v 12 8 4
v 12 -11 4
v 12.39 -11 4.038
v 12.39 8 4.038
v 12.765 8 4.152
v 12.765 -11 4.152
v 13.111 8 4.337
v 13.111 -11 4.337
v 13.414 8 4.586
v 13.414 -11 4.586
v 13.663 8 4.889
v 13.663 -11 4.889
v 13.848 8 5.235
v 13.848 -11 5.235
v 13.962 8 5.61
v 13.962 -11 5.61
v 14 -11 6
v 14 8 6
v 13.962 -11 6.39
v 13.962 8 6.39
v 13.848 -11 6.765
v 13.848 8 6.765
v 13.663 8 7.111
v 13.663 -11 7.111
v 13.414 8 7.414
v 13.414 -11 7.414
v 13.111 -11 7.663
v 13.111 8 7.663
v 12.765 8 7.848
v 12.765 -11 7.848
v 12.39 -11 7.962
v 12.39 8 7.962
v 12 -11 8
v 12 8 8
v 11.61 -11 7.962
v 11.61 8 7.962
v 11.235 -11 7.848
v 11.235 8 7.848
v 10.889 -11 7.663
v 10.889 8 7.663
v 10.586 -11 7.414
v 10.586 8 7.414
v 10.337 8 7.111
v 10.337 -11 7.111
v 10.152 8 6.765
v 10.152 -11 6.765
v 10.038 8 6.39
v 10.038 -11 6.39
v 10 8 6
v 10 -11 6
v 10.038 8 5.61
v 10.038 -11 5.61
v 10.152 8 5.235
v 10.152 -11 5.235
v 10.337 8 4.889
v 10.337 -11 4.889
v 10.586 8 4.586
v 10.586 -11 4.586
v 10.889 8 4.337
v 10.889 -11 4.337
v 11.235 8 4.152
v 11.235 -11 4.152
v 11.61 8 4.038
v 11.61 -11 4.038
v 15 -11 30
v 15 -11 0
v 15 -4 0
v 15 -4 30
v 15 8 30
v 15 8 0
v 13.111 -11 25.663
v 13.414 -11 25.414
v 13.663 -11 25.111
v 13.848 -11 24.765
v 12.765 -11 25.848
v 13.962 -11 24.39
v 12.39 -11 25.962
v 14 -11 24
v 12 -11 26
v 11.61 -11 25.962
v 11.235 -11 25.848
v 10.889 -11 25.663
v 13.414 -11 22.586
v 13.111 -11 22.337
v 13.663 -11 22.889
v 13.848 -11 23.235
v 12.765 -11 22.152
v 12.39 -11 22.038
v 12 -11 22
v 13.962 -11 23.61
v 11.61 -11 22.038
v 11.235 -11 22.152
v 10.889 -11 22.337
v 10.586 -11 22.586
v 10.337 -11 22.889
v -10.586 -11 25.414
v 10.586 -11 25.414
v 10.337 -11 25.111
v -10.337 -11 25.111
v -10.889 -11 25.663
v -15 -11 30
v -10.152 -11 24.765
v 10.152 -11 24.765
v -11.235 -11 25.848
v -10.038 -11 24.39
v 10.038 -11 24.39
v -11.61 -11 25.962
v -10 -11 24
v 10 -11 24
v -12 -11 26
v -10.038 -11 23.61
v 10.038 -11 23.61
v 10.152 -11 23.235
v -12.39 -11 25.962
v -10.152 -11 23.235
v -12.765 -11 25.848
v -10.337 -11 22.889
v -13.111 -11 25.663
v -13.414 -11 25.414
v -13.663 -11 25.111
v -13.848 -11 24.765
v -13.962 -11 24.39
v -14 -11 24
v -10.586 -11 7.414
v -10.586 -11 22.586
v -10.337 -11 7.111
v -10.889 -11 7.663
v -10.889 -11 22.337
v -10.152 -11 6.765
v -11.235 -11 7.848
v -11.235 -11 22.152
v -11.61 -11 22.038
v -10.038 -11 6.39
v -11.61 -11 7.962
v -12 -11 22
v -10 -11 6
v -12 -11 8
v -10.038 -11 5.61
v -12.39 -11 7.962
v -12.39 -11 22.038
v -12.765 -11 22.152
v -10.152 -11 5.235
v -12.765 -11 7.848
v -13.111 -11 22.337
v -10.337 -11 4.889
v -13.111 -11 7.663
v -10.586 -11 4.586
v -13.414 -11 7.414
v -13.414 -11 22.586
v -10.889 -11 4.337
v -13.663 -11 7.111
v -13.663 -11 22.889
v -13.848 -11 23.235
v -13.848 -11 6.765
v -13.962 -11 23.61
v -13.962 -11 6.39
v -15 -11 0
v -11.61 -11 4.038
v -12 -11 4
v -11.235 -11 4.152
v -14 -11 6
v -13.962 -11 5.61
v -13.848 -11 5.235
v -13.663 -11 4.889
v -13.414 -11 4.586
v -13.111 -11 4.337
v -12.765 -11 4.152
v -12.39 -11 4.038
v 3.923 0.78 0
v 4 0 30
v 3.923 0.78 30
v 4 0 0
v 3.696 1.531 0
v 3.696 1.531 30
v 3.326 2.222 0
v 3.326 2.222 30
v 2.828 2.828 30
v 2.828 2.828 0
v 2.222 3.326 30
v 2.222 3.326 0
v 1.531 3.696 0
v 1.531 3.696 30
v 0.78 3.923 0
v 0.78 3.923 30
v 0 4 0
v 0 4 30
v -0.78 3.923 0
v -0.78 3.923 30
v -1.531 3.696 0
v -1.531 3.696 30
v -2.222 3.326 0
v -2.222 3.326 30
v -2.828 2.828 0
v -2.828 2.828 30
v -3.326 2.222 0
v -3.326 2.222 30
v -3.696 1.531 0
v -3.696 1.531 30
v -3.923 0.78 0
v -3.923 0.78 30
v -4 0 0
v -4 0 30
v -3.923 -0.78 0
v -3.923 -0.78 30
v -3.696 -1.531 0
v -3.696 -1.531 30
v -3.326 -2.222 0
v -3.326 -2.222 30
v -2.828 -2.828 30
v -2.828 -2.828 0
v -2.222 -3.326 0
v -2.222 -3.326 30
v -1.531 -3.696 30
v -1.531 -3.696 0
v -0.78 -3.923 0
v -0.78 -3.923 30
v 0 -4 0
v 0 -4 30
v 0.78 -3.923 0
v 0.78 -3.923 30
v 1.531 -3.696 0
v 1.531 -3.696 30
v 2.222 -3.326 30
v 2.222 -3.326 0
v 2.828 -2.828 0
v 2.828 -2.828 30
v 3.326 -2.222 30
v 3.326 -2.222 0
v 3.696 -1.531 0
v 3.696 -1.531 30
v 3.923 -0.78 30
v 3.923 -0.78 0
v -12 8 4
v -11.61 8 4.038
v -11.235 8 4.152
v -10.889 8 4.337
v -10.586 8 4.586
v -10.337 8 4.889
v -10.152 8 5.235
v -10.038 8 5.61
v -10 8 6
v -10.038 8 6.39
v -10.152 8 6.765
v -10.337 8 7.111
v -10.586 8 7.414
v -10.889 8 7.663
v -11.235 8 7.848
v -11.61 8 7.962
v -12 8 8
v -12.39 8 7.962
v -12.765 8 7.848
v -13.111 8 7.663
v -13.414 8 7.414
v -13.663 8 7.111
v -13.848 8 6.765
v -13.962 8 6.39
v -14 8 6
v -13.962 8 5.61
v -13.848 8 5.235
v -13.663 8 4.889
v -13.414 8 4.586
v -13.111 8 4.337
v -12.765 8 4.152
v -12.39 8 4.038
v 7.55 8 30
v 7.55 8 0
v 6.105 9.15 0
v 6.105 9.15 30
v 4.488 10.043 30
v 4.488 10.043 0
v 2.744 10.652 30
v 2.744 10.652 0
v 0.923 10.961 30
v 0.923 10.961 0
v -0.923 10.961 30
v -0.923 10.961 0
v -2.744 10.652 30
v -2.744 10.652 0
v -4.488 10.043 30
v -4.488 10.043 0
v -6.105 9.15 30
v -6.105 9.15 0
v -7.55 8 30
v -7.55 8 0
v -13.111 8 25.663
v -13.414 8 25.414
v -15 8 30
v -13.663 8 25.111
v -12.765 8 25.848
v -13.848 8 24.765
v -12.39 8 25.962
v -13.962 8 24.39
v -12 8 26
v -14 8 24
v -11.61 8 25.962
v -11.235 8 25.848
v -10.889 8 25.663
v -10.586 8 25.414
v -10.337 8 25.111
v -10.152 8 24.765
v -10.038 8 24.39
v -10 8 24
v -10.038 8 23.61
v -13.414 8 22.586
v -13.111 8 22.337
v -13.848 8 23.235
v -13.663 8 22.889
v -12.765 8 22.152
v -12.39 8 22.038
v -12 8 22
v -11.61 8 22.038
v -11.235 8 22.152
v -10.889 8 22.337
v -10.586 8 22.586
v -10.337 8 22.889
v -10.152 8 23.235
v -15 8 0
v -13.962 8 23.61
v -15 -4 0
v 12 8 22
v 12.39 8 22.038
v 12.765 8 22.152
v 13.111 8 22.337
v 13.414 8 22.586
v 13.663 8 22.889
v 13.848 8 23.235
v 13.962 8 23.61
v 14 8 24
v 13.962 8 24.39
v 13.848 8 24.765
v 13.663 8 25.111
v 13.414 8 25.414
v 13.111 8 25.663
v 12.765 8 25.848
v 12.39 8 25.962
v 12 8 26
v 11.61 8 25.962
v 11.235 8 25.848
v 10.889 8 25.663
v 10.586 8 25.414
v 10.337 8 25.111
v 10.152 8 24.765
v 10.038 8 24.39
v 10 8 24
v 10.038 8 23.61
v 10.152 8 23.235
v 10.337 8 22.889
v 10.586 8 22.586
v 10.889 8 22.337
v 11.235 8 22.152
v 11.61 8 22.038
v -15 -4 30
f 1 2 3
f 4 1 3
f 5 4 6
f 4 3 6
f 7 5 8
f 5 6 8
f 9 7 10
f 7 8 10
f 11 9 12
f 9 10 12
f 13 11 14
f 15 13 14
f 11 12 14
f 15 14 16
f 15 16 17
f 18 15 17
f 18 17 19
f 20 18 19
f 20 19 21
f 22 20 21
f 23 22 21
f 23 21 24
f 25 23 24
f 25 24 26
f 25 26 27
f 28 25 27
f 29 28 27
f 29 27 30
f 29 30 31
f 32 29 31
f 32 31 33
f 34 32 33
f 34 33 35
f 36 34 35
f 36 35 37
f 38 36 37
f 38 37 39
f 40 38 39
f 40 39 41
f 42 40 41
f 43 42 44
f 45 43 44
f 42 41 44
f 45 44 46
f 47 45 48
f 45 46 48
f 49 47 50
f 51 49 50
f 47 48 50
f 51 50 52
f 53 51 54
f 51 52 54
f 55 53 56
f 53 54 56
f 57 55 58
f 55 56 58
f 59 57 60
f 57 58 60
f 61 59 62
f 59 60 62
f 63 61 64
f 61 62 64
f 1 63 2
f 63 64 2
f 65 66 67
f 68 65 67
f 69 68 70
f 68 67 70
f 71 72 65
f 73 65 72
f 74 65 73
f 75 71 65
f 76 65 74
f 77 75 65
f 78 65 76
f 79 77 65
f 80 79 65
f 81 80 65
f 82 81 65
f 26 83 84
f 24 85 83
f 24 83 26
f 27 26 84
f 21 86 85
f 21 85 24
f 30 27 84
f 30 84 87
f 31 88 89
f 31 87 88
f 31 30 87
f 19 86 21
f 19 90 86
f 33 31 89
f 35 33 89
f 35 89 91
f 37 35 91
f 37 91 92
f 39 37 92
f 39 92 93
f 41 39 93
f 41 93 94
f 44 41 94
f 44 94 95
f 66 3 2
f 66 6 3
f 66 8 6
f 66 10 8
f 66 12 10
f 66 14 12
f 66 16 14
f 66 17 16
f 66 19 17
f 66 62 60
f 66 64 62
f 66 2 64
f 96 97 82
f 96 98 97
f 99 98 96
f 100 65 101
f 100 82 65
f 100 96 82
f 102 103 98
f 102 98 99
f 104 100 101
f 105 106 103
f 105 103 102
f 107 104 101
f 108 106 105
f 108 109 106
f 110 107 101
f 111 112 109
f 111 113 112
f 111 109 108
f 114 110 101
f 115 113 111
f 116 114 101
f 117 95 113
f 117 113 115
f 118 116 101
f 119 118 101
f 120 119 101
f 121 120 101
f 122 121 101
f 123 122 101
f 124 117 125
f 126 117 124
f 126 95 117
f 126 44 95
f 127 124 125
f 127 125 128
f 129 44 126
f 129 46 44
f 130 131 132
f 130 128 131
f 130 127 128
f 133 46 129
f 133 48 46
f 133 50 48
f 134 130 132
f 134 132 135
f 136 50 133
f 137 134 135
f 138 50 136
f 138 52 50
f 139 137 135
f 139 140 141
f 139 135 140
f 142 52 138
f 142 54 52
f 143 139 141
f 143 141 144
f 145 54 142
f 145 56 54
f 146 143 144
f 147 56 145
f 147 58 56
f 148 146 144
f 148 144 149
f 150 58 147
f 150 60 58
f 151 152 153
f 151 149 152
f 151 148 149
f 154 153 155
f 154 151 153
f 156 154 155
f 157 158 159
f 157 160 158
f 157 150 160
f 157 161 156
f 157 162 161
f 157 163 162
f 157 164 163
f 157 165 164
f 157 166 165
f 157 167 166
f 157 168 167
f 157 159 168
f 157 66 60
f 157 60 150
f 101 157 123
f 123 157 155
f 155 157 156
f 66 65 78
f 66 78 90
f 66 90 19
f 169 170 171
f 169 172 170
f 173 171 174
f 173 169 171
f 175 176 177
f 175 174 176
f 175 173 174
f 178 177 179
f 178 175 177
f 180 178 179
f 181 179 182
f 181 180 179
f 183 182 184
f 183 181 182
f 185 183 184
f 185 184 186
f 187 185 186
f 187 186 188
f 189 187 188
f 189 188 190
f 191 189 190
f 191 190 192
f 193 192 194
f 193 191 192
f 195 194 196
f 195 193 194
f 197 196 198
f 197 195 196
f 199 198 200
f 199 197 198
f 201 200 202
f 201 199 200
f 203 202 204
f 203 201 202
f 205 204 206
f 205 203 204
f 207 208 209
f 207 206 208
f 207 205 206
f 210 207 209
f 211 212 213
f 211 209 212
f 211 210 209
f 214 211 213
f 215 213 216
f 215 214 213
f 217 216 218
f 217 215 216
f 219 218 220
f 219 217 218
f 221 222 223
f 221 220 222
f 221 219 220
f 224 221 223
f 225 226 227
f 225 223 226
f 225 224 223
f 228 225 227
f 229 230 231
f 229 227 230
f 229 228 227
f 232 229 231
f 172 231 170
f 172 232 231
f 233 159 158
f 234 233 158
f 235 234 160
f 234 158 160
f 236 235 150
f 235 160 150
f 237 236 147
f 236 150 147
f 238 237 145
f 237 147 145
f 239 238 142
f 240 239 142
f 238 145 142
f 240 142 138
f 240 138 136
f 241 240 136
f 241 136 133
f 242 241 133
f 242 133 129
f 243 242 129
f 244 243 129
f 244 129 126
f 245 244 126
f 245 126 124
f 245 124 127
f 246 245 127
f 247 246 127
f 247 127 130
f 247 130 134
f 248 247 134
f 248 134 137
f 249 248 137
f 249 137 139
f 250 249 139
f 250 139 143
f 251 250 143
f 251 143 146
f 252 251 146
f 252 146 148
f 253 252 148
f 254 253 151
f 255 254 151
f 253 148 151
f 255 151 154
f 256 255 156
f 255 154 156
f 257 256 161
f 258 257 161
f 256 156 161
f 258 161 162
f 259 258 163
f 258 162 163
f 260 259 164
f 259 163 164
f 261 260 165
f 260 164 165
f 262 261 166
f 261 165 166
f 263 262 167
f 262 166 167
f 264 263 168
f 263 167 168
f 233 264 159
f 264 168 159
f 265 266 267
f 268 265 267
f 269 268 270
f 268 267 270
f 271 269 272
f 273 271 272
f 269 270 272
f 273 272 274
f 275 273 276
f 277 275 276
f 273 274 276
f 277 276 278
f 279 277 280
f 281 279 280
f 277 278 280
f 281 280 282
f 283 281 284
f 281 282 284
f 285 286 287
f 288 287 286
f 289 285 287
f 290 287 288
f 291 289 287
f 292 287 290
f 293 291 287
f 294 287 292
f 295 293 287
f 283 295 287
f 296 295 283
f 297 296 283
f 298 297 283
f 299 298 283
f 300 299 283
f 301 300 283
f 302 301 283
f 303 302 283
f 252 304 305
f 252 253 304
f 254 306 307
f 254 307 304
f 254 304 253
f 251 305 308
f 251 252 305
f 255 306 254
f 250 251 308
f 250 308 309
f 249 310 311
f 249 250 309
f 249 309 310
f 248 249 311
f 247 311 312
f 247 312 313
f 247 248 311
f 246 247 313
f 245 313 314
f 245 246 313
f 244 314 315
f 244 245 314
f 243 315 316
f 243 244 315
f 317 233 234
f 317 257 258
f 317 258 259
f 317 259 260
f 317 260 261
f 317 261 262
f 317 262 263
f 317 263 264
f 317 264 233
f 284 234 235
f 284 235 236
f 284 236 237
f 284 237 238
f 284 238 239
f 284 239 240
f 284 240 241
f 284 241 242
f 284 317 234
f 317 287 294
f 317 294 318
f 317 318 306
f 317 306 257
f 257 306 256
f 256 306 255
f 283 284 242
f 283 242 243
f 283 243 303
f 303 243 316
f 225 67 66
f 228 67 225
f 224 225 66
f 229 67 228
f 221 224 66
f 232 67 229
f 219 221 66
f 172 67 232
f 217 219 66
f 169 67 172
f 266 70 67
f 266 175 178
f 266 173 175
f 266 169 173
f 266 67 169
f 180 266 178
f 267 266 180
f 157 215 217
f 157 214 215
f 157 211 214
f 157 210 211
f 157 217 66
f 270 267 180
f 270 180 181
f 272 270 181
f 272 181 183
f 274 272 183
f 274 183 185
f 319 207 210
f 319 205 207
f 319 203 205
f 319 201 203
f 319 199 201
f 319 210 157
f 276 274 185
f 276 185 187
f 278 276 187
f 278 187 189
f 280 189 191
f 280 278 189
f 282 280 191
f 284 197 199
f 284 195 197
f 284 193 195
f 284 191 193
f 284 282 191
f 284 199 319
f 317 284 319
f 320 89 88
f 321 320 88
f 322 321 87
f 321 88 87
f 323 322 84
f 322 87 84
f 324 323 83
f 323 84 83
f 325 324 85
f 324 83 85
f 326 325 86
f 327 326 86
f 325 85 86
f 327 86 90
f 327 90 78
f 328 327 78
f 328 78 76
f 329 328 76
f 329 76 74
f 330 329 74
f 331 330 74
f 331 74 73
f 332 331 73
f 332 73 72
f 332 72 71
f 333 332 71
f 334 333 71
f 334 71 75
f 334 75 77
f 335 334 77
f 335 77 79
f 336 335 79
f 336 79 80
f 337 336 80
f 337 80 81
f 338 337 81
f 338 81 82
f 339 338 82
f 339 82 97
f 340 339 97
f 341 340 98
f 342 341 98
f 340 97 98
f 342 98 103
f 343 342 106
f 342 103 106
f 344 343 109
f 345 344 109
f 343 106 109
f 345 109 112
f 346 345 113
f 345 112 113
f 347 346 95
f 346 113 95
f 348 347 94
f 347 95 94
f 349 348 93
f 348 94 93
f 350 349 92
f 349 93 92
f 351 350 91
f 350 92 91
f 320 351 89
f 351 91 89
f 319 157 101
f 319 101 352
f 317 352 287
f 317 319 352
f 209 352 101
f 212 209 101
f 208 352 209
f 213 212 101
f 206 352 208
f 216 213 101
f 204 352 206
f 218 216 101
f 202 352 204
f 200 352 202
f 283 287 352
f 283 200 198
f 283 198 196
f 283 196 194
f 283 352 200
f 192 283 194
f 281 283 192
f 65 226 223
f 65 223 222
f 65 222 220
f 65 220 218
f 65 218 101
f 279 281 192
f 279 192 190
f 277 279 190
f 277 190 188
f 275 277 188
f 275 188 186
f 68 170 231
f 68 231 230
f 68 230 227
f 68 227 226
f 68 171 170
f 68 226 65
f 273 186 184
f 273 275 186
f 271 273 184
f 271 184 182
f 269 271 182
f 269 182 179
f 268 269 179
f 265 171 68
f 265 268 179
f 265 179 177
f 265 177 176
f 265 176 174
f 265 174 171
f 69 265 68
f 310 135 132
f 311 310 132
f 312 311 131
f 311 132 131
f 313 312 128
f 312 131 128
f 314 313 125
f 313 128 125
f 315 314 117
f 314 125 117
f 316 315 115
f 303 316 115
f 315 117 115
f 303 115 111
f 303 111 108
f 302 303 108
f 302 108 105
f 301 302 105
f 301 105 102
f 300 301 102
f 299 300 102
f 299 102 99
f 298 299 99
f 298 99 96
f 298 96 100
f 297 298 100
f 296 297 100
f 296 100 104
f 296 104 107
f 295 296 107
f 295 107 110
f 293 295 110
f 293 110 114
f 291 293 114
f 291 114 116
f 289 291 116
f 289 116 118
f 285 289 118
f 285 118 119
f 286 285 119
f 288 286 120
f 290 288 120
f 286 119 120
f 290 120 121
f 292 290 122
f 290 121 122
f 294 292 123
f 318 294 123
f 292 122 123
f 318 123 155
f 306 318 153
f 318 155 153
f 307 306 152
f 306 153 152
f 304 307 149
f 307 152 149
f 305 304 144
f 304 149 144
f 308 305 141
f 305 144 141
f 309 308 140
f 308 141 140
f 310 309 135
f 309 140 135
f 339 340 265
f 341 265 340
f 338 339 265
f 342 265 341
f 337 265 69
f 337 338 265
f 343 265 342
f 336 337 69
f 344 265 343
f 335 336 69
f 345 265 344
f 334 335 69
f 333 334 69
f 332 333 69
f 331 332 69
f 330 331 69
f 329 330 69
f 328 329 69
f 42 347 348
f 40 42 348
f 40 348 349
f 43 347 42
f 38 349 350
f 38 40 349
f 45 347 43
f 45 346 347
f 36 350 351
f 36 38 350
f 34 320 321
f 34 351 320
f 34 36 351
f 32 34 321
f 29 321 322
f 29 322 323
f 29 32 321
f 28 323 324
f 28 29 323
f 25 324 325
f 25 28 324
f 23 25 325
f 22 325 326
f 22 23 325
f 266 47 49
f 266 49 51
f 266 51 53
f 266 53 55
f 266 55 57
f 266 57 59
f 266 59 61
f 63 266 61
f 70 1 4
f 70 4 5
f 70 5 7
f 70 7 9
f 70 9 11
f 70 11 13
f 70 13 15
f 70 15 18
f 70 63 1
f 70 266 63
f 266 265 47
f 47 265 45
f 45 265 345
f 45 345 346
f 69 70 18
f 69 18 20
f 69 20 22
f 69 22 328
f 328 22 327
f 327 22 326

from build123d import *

# Parameters (mm, degrees)
SZKIC1_R                    = 11
SZKIC1_R_2                  = 4
DODANIE_WYCI_GNI_CIE1_DEPTH = 30
SZKIC5_W                    = 15
SZKIC5_H                    = 7
DODANIE_WYCI_GNI_CIE2_DEPTH = 30
SZKIC6_W                    = 15
SZKIC6_H                    = 7
DODANIE_WYCI_GNI_CIE3_DEPTH = 30
SZKIC7_W                    = 7.450165565
SZKIC7_H                    = 12
DODANIE_WYCI_GNI_CIE4_DEPTH = 30
WYTNIJ_WYCI_GNI_CIE1_REACH  = 42.112
SZKIC8_R                    = 2


with BuildPart() as part:
    # Szkic1 → Dodanie-wyciągnięcie1 (new body)
    with BuildSketch(Plane.XY):
        Circle(SZKIC1_R)
        Circle(SZKIC1_R_2, mode=Mode.SUBTRACT)
    extrude(amount=DODANIE_WYCI_GNI_CIE1_DEPTH)

    # Szkic5 → Dodanie-wyciągnięcie2 (add)
    with BuildSketch(Plane(origin=(0, 0, 0), x_dir=(-1, 0, 0), z_dir=(0, 0, -1))):
        with Locations((7.5, -7.5)):
            Rectangle(SZKIC5_W, SZKIC5_H)
    extrude(amount=-DODANIE_WYCI_GNI_CIE2_DEPTH)

    # Szkic6 → Dodanie-wyciągnięcie3 (add)
    with BuildSketch(Plane.XY):
        with Locations((7.5, -7.5)):
            Rectangle(SZKIC6_W, SZKIC6_H)
    extrude(amount=DODANIE_WYCI_GNI_CIE3_DEPTH)

    # Szkic7 → Dodanie-wyciągnięcie4 (add)
    with BuildSketch(Plane.XY):
        with Locations((11.274917218, 2)):
            Rectangle(SZKIC7_W, SZKIC7_H)
        with Locations((-11.274917218, 2)):
            Rectangle(SZKIC7_W, SZKIC7_H)
    extrude(amount=DODANIE_WYCI_GNI_CIE4_DEPTH)

    # Szkic8 → Wytnij-wyciągnięcie1 (cut, up to next)
    with BuildSketch(Plane.XZ.offset(11), mode=Mode.PRIVATE) as wytnij_wyci_gni_cie1_sk1:
        with Locations(Location((-12, 24, 0), (0, 0, 270))):
            Circle(SZKIC8_R)
    wytnij_wyci_gni_cie1_tool1 = extrude(wytnij_wyci_gni_cie1_sk1.sketch, amount=-WYTNIJ_WYCI_GNI_CIE1_REACH, mode=Mode.PRIVATE) & part.part
    # Szkic8 → Wytnij-wyciągnięcie1 (cut, up to next)
    with BuildSketch(Plane.XZ.offset(11), mode=Mode.PRIVATE) as wytnij_wyci_gni_cie1_sk2:
        with Locations(Location((12, 24, 0), (0, 0, 270))):
            Circle(SZKIC8_R)
    wytnij_wyci_gni_cie1_tool2 = extrude(wytnij_wyci_gni_cie1_sk2.sketch, amount=-WYTNIJ_WYCI_GNI_CIE1_REACH, mode=Mode.PRIVATE) & part.part
    # Szkic8 → Wytnij-wyciągnięcie1 (cut, up to next)
    with BuildSketch(Plane.XZ.offset(11), mode=Mode.PRIVATE) as wytnij_wyci_gni_cie1_sk3:
        with Locations(Location((12, 6, 0), (0, 0, 270))):
            Circle(SZKIC8_R)
    wytnij_wyci_gni_cie1_tool3 = extrude(wytnij_wyci_gni_cie1_sk3.sketch, amount=-WYTNIJ_WYCI_GNI_CIE1_REACH, mode=Mode.PRIVATE) & part.part
    # Szkic8 → Wytnij-wyciągnięcie1 (cut, up to next)
    with BuildSketch(Plane.XZ.offset(11), mode=Mode.PRIVATE) as wytnij_wyci_gni_cie1_sk4:
        with Locations(Location((-12, 6, 0), (0, 0, 270))):
            Circle(SZKIC8_R)
    wytnij_wyci_gni_cie1_tool4 = extrude(wytnij_wyci_gni_cie1_sk4.sketch, amount=-WYTNIJ_WYCI_GNI_CIE1_REACH, mode=Mode.PRIVATE) & part.part
    add(wytnij_wyci_gni_cie1_tool1.solids().sort_by_distance((-12, -11, 24))[0], mode=Mode.SUBTRACT)
    add(wytnij_wyci_gni_cie1_tool2.solids().sort_by_distance((12, -11, 24))[0], mode=Mode.SUBTRACT)
    add(wytnij_wyci_gni_cie1_tool3.solids().sort_by_distance((12, -11, 6))[0], mode=Mode.SUBTRACT)
    add(wytnij_wyci_gni_cie1_tool4.solids().sort_by_distance((-12, -11, 6))[0], mode=Mode.SUBTRACT)


solid = part.part
